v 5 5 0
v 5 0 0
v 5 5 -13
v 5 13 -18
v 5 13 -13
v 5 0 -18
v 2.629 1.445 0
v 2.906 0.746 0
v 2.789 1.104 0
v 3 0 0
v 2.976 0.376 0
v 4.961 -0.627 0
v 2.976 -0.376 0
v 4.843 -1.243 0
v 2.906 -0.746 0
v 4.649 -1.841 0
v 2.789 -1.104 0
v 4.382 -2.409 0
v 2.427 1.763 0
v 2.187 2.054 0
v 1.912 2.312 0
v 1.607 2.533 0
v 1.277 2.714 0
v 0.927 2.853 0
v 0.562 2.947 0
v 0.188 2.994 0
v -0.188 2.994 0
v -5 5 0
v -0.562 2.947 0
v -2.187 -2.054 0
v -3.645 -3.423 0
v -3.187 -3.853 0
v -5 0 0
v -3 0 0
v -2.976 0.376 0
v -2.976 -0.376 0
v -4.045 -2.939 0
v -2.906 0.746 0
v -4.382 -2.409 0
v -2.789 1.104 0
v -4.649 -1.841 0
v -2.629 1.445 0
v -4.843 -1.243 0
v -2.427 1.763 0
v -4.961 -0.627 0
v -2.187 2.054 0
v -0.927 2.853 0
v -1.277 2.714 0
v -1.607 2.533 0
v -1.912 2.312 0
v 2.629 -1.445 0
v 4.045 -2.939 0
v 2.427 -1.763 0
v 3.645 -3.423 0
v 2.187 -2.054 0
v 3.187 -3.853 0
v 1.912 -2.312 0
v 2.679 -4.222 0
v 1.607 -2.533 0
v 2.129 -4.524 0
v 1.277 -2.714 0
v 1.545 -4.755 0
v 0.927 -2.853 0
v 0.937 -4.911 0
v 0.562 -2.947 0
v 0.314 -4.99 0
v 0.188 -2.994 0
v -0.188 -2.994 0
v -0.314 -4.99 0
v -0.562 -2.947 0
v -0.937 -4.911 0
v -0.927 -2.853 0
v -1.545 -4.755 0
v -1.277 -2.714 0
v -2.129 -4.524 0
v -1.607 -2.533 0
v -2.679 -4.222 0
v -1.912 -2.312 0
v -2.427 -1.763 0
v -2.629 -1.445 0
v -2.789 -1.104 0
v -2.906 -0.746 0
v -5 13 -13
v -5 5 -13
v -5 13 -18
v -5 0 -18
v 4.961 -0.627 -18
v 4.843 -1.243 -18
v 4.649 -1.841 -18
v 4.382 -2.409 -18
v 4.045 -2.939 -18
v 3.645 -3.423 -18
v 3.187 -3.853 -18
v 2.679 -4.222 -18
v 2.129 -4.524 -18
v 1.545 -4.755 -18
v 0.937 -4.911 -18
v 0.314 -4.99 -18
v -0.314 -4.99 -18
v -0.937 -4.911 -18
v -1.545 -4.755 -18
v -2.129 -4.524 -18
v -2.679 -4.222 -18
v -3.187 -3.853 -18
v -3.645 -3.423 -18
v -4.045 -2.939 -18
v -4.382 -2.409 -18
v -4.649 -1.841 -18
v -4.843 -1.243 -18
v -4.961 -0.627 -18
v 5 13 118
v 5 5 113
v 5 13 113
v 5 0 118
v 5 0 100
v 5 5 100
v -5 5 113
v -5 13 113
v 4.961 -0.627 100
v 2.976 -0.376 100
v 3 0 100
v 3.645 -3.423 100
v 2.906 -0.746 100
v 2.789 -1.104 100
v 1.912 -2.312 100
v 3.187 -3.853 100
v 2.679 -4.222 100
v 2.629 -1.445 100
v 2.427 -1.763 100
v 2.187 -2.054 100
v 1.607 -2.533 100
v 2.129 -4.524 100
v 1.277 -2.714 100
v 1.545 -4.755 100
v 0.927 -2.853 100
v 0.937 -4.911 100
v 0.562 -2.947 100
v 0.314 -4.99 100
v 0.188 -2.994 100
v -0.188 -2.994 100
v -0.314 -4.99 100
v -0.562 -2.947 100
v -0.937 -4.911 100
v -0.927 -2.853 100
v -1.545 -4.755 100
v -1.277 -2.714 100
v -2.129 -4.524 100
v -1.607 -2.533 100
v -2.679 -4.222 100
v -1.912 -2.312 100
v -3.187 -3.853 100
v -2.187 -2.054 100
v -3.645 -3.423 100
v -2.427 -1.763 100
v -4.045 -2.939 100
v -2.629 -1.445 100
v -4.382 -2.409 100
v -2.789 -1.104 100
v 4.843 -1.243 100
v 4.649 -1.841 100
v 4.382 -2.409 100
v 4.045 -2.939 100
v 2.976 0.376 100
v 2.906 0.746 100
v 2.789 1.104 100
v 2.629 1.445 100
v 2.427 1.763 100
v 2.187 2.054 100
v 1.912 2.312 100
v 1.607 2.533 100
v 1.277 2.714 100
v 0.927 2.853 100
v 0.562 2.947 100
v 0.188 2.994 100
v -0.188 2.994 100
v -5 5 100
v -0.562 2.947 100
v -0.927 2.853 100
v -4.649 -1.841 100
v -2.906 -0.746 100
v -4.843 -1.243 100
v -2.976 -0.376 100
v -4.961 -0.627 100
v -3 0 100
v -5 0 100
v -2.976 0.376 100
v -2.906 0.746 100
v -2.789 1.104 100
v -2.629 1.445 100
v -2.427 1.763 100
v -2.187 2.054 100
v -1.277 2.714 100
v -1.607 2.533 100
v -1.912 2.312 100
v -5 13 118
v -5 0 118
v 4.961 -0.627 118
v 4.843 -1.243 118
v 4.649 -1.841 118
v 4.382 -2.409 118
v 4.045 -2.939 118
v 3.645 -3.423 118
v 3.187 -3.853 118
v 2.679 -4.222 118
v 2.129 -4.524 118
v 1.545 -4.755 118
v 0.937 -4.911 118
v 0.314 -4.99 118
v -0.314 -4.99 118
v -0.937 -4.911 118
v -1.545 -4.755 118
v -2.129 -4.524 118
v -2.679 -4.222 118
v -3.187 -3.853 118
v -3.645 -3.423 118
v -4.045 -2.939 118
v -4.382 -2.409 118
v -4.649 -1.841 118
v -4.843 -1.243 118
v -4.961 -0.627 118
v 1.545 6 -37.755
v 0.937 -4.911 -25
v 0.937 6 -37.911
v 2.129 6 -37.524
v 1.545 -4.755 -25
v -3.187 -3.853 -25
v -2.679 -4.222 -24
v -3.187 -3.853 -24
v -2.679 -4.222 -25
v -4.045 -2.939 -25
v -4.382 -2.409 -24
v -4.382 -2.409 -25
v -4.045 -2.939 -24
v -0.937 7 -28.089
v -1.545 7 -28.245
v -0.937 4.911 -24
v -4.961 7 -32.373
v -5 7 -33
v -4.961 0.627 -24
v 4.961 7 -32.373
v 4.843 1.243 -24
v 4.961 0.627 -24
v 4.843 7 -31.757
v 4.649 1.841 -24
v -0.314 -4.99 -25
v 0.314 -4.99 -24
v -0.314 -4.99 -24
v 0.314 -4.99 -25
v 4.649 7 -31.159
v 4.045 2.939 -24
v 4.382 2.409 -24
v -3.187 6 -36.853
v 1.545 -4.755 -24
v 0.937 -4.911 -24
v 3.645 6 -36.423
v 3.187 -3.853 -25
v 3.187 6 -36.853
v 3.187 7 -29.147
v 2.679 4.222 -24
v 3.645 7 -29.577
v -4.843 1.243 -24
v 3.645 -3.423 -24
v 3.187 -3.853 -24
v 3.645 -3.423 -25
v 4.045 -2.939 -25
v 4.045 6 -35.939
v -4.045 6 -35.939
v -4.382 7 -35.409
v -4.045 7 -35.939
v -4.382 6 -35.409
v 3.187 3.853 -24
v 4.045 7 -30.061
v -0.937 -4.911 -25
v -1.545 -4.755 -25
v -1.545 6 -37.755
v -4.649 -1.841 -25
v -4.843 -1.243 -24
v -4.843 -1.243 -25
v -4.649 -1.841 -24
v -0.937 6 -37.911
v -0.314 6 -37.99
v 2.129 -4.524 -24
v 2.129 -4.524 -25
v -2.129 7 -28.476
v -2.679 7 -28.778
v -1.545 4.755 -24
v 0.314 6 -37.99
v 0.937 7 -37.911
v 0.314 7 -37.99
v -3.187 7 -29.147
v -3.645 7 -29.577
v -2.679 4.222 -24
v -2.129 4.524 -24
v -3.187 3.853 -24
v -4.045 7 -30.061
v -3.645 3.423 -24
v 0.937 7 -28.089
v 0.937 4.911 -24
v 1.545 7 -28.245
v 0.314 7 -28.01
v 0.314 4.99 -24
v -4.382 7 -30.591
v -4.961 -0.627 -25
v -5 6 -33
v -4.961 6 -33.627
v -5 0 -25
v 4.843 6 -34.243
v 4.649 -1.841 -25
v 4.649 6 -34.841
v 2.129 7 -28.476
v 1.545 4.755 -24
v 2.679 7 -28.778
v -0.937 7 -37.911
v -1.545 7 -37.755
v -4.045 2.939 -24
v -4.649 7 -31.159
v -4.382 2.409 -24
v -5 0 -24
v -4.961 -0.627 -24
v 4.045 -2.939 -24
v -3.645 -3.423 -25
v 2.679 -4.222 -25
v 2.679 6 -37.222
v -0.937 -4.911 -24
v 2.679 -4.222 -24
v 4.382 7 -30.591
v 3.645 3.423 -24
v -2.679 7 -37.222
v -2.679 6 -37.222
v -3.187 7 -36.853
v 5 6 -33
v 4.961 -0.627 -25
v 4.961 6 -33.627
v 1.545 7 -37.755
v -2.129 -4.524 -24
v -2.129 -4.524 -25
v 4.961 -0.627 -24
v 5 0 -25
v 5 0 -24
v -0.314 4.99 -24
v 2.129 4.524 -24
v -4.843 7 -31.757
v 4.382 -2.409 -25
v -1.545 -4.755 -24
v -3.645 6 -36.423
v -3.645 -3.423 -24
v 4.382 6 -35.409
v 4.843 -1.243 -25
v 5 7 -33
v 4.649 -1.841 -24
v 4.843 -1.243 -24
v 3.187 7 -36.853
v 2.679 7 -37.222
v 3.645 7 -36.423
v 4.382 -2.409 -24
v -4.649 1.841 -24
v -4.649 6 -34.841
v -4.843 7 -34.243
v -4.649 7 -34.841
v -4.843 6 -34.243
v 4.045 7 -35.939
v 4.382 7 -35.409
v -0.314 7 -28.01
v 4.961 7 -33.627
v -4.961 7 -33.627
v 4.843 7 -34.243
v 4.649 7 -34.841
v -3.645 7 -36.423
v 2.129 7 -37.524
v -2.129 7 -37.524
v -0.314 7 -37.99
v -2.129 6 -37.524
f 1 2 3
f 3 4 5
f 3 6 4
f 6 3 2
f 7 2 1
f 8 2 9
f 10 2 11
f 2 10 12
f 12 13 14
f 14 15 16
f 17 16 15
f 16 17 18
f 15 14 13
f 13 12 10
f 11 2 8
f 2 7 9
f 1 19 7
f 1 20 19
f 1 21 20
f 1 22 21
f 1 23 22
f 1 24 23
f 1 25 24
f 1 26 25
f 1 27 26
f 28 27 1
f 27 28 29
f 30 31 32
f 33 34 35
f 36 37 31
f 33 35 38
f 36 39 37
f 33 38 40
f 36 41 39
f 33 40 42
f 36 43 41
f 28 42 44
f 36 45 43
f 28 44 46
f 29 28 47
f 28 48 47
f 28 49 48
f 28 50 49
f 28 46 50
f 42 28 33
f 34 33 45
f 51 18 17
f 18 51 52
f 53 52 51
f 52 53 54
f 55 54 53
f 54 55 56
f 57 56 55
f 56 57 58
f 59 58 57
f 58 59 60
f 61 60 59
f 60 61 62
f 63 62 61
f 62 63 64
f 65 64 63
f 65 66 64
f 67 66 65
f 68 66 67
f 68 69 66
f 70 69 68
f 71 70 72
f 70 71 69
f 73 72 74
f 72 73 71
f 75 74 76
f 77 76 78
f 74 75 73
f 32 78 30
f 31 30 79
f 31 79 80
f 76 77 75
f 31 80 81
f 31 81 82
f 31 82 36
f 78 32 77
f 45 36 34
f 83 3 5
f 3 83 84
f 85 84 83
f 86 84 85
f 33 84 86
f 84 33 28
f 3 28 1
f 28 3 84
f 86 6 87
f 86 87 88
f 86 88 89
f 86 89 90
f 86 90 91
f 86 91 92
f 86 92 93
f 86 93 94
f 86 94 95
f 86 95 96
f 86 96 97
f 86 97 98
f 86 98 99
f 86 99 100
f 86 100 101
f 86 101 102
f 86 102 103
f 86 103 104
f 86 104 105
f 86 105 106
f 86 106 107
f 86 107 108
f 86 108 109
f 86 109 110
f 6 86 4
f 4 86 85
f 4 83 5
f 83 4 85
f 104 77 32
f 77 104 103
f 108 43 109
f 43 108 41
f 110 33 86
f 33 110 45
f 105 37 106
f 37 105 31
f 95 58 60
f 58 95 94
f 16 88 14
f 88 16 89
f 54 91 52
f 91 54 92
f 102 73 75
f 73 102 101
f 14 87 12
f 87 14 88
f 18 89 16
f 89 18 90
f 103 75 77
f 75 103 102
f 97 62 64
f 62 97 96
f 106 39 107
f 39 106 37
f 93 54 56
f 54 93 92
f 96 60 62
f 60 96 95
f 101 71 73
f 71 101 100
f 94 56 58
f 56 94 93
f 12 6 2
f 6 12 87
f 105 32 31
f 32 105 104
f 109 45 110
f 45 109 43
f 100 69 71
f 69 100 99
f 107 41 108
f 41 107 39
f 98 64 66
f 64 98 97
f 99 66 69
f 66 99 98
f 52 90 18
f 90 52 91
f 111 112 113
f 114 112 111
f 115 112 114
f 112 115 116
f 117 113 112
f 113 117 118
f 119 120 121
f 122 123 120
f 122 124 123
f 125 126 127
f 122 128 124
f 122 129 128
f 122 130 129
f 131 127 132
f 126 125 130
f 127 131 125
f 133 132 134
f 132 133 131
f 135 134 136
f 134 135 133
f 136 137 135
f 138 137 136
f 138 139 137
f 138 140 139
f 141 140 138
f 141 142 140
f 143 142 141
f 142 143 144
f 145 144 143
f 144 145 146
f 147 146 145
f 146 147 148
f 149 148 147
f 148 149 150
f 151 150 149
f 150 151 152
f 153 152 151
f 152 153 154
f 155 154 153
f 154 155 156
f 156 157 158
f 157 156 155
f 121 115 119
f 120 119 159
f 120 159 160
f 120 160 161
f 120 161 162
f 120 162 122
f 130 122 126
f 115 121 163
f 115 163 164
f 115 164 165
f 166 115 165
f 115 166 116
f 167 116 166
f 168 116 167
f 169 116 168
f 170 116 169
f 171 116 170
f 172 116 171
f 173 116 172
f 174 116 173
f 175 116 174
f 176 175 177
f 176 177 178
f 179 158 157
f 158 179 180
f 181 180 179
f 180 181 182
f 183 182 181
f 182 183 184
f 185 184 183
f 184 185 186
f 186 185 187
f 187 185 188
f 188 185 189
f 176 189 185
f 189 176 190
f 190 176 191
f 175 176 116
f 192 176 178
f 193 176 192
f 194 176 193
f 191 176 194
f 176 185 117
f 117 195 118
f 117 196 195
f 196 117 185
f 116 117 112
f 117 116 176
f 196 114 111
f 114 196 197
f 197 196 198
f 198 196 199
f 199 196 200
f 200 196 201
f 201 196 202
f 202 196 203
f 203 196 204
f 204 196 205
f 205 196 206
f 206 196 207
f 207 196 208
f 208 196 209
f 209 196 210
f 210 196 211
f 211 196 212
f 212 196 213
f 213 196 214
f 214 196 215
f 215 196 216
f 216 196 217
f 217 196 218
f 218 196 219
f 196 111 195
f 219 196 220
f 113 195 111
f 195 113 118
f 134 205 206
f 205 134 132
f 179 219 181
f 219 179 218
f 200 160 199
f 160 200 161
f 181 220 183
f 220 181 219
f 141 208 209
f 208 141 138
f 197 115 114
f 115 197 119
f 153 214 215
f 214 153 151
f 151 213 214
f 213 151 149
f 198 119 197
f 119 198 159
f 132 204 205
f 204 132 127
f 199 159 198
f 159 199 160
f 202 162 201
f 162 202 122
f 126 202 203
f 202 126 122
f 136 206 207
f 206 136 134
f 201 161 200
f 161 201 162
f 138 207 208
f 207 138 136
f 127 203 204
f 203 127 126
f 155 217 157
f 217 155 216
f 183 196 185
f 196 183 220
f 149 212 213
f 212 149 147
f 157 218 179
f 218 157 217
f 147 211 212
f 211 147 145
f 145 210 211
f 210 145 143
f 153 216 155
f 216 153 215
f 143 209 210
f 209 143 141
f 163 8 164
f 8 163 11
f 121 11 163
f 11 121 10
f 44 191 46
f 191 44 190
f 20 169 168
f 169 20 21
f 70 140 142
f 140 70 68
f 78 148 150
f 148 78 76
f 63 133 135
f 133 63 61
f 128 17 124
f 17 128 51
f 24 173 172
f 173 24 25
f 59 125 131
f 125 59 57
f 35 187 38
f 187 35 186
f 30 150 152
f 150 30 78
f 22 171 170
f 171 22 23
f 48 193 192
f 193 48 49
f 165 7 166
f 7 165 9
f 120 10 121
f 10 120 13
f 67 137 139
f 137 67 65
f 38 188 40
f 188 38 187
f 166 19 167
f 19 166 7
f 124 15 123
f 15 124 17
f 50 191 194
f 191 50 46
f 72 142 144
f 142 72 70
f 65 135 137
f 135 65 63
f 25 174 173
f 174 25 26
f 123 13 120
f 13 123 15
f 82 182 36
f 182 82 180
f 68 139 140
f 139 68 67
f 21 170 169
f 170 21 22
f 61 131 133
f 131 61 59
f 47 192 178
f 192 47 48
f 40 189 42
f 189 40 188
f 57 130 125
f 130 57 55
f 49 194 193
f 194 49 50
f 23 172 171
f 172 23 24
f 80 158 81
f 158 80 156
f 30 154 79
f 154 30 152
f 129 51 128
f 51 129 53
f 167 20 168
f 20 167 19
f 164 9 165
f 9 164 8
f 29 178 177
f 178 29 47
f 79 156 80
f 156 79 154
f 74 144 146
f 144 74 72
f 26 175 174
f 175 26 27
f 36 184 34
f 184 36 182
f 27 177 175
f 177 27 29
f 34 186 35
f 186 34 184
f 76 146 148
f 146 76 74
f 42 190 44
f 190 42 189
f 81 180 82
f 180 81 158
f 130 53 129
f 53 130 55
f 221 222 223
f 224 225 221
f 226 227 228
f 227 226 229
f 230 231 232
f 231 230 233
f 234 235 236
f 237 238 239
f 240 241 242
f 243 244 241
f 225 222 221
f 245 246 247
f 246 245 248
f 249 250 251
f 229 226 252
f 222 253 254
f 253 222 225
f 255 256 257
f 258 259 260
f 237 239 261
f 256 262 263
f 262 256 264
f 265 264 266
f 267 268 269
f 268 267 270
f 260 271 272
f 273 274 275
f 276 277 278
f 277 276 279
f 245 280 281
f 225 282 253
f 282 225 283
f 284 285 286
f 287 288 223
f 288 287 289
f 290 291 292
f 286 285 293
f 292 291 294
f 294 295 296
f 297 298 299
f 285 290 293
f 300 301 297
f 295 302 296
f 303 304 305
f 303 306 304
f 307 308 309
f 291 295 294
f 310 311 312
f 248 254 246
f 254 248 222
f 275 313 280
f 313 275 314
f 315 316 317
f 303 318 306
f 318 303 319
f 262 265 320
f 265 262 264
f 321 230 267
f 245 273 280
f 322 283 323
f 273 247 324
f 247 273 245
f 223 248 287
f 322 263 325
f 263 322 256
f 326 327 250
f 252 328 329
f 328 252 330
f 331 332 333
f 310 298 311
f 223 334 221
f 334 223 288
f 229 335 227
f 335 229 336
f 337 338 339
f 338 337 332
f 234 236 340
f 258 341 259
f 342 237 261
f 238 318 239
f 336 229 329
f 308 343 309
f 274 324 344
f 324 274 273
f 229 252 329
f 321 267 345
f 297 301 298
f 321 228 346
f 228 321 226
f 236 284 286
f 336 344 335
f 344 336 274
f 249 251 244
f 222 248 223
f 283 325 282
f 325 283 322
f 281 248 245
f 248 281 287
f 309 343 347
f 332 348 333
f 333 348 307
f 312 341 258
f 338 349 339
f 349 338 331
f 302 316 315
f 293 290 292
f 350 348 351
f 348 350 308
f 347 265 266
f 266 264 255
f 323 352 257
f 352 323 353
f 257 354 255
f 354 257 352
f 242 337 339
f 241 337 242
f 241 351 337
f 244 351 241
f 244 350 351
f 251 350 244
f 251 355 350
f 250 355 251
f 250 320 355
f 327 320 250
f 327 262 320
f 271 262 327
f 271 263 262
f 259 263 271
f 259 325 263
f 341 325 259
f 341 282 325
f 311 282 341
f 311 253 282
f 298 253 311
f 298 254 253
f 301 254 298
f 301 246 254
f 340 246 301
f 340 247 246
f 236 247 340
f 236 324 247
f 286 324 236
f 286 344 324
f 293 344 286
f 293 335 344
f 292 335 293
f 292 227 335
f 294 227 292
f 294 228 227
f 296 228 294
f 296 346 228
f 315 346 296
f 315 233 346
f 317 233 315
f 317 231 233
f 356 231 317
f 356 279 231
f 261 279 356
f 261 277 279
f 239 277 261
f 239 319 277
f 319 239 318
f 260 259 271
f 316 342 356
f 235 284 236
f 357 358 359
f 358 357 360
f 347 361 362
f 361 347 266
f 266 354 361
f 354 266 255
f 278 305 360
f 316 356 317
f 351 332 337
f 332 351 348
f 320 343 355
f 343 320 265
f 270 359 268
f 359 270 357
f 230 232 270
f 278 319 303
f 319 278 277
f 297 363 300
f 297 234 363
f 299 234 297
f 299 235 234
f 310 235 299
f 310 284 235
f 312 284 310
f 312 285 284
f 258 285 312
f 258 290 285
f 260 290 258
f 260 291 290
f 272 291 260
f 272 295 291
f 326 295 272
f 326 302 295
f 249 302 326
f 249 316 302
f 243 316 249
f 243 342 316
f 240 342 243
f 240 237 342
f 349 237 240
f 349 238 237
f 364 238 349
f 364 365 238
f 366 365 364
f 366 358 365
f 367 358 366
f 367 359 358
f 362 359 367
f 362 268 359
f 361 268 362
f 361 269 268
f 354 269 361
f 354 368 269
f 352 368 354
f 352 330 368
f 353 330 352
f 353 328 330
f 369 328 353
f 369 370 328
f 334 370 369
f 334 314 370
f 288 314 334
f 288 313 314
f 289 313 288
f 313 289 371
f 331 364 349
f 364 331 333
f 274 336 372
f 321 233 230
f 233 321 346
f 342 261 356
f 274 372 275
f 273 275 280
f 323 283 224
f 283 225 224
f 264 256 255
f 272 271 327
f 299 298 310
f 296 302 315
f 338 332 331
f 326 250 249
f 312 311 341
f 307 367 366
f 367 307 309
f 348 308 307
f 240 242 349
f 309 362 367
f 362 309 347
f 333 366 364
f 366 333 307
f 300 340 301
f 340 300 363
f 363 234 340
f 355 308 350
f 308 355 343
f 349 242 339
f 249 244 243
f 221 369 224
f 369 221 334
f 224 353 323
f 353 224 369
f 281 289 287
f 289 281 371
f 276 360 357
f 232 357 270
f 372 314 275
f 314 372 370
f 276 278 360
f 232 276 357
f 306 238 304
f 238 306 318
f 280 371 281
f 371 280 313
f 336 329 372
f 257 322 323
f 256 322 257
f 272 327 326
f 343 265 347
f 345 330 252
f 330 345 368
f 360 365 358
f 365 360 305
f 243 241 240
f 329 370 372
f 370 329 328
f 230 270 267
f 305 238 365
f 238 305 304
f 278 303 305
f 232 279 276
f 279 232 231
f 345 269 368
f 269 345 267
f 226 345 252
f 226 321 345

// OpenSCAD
// file: Klima_Protekta_Traction_Dimensions.scad
/* This file contains the key dimensions of various aspects of the traction subsystem.  Change it in one place and everything that is affected by that change is recomputed to be correct. 

This file is to be "include"d into all other traction geometry files.  

include <KlimaProtekta/Traction/Geometry/Klima_Protekta_Traction_Dimensions.scad>;

One advantage of this approach is that it enforces consistency between parts of the car.  

Remember: Calculate Everything (avoid endless tweaking) 


*/

// One unit is one millimeter here
permanentMagnetWidth = 10; // generally width is X (but magnets are rotated here)
permanentMagnetDepth = 10; // generally depth is Y (but magnets are rotated here)
permanentMagnetHeight = 10; // generally height is Z (but magnets are rotated here)
magnetsPerCircle = 64; 
magnetCirclesPerWheel = 2; 
wheelsPerCar = 4; 
echo("Traction Permanent Magnets Per Car: ", magnetsPerCircle * magnetCirclesPerWheel * wheelsPerCar);

degreesPerMagnet = 360 / magnetsPerCircle; // includes gap between magnets
gapEasyInsert = 0.3; // air for both front and back added together, rule of thumb (test to ensure no rattling)
magnetHoleWidth = permanentMagnetWidth + gapEasyInsert; // default 10.3 mm
magnetToMagnetNylon = 0.3; // this is the smallest distance between two magnets in the circle
magnetToAirgapNylon = 0.4; // layer of nylon to keep magnets from rubbing and shattering
airgap = 0.7; //
electromagnetToAirgapNylon = 0.4; // layer of nylon to keep electromagnets from rubbing and shattering
magnetToElectromagnetGap =  magnetToAirgapNylon + airgap + electromagnetToAirgapNylon;
echo("Permanent Magnet To Electromagnet Gap, commonly called Airgap: ", magnetToElectromagnetGap); // note that this is the maximum.  Affected by permanent magnet having straight edges not curved.  Affected by bearing wobble. 

circleOne = 100; // The smallest circle that all of the permanent magnets have two edges passing through. 
// main file
// Klima_Protecta_Traction_Stator_Electromagnet_Core

// sits in Stator

include<Klima_Protekta_Traction_Dimensions.scad>;

cylinder(h=100, r=3, centre=true, $fn=50);

translate([-5,0,-13]) {
color("red") cube([10,5,13], centre=true); // main contact
        translate([0,0,-5]){
color("red") cube([10,13,5], centre=true); // end bearing
    }
    translate([5, 0, -5]){
color("red") cylinder(h=18, r=5, centre=true, $fn=50);
    }
}

translate([-5,0,100]) {
color("blue") cube([10,5,13], centre=true); //  main contact
    translate([0,0,13]){
color("blue") cube([10,13,5], centre=true); // end bearing 
    }
translate([5, 0, 0]){
color("blue") cylinder(h=18, r=5, centre=true, $fn=50);
}
}

 translate([0,0,-20])hull(){
    translate([0, 0, -5])
    color("green") cylinder(h=1, r=5, centre=true, $fn=50);
    translate([0,7,-13])rotate(90,[1,0,0])difference(){
            cylinder(h=1, r=5, centre=true, $fn=50);
            translate([0,5,0])cube(10,10,1);
    } // end difference
     
     //cube([10,1,5], centre=true);
} // end hull
